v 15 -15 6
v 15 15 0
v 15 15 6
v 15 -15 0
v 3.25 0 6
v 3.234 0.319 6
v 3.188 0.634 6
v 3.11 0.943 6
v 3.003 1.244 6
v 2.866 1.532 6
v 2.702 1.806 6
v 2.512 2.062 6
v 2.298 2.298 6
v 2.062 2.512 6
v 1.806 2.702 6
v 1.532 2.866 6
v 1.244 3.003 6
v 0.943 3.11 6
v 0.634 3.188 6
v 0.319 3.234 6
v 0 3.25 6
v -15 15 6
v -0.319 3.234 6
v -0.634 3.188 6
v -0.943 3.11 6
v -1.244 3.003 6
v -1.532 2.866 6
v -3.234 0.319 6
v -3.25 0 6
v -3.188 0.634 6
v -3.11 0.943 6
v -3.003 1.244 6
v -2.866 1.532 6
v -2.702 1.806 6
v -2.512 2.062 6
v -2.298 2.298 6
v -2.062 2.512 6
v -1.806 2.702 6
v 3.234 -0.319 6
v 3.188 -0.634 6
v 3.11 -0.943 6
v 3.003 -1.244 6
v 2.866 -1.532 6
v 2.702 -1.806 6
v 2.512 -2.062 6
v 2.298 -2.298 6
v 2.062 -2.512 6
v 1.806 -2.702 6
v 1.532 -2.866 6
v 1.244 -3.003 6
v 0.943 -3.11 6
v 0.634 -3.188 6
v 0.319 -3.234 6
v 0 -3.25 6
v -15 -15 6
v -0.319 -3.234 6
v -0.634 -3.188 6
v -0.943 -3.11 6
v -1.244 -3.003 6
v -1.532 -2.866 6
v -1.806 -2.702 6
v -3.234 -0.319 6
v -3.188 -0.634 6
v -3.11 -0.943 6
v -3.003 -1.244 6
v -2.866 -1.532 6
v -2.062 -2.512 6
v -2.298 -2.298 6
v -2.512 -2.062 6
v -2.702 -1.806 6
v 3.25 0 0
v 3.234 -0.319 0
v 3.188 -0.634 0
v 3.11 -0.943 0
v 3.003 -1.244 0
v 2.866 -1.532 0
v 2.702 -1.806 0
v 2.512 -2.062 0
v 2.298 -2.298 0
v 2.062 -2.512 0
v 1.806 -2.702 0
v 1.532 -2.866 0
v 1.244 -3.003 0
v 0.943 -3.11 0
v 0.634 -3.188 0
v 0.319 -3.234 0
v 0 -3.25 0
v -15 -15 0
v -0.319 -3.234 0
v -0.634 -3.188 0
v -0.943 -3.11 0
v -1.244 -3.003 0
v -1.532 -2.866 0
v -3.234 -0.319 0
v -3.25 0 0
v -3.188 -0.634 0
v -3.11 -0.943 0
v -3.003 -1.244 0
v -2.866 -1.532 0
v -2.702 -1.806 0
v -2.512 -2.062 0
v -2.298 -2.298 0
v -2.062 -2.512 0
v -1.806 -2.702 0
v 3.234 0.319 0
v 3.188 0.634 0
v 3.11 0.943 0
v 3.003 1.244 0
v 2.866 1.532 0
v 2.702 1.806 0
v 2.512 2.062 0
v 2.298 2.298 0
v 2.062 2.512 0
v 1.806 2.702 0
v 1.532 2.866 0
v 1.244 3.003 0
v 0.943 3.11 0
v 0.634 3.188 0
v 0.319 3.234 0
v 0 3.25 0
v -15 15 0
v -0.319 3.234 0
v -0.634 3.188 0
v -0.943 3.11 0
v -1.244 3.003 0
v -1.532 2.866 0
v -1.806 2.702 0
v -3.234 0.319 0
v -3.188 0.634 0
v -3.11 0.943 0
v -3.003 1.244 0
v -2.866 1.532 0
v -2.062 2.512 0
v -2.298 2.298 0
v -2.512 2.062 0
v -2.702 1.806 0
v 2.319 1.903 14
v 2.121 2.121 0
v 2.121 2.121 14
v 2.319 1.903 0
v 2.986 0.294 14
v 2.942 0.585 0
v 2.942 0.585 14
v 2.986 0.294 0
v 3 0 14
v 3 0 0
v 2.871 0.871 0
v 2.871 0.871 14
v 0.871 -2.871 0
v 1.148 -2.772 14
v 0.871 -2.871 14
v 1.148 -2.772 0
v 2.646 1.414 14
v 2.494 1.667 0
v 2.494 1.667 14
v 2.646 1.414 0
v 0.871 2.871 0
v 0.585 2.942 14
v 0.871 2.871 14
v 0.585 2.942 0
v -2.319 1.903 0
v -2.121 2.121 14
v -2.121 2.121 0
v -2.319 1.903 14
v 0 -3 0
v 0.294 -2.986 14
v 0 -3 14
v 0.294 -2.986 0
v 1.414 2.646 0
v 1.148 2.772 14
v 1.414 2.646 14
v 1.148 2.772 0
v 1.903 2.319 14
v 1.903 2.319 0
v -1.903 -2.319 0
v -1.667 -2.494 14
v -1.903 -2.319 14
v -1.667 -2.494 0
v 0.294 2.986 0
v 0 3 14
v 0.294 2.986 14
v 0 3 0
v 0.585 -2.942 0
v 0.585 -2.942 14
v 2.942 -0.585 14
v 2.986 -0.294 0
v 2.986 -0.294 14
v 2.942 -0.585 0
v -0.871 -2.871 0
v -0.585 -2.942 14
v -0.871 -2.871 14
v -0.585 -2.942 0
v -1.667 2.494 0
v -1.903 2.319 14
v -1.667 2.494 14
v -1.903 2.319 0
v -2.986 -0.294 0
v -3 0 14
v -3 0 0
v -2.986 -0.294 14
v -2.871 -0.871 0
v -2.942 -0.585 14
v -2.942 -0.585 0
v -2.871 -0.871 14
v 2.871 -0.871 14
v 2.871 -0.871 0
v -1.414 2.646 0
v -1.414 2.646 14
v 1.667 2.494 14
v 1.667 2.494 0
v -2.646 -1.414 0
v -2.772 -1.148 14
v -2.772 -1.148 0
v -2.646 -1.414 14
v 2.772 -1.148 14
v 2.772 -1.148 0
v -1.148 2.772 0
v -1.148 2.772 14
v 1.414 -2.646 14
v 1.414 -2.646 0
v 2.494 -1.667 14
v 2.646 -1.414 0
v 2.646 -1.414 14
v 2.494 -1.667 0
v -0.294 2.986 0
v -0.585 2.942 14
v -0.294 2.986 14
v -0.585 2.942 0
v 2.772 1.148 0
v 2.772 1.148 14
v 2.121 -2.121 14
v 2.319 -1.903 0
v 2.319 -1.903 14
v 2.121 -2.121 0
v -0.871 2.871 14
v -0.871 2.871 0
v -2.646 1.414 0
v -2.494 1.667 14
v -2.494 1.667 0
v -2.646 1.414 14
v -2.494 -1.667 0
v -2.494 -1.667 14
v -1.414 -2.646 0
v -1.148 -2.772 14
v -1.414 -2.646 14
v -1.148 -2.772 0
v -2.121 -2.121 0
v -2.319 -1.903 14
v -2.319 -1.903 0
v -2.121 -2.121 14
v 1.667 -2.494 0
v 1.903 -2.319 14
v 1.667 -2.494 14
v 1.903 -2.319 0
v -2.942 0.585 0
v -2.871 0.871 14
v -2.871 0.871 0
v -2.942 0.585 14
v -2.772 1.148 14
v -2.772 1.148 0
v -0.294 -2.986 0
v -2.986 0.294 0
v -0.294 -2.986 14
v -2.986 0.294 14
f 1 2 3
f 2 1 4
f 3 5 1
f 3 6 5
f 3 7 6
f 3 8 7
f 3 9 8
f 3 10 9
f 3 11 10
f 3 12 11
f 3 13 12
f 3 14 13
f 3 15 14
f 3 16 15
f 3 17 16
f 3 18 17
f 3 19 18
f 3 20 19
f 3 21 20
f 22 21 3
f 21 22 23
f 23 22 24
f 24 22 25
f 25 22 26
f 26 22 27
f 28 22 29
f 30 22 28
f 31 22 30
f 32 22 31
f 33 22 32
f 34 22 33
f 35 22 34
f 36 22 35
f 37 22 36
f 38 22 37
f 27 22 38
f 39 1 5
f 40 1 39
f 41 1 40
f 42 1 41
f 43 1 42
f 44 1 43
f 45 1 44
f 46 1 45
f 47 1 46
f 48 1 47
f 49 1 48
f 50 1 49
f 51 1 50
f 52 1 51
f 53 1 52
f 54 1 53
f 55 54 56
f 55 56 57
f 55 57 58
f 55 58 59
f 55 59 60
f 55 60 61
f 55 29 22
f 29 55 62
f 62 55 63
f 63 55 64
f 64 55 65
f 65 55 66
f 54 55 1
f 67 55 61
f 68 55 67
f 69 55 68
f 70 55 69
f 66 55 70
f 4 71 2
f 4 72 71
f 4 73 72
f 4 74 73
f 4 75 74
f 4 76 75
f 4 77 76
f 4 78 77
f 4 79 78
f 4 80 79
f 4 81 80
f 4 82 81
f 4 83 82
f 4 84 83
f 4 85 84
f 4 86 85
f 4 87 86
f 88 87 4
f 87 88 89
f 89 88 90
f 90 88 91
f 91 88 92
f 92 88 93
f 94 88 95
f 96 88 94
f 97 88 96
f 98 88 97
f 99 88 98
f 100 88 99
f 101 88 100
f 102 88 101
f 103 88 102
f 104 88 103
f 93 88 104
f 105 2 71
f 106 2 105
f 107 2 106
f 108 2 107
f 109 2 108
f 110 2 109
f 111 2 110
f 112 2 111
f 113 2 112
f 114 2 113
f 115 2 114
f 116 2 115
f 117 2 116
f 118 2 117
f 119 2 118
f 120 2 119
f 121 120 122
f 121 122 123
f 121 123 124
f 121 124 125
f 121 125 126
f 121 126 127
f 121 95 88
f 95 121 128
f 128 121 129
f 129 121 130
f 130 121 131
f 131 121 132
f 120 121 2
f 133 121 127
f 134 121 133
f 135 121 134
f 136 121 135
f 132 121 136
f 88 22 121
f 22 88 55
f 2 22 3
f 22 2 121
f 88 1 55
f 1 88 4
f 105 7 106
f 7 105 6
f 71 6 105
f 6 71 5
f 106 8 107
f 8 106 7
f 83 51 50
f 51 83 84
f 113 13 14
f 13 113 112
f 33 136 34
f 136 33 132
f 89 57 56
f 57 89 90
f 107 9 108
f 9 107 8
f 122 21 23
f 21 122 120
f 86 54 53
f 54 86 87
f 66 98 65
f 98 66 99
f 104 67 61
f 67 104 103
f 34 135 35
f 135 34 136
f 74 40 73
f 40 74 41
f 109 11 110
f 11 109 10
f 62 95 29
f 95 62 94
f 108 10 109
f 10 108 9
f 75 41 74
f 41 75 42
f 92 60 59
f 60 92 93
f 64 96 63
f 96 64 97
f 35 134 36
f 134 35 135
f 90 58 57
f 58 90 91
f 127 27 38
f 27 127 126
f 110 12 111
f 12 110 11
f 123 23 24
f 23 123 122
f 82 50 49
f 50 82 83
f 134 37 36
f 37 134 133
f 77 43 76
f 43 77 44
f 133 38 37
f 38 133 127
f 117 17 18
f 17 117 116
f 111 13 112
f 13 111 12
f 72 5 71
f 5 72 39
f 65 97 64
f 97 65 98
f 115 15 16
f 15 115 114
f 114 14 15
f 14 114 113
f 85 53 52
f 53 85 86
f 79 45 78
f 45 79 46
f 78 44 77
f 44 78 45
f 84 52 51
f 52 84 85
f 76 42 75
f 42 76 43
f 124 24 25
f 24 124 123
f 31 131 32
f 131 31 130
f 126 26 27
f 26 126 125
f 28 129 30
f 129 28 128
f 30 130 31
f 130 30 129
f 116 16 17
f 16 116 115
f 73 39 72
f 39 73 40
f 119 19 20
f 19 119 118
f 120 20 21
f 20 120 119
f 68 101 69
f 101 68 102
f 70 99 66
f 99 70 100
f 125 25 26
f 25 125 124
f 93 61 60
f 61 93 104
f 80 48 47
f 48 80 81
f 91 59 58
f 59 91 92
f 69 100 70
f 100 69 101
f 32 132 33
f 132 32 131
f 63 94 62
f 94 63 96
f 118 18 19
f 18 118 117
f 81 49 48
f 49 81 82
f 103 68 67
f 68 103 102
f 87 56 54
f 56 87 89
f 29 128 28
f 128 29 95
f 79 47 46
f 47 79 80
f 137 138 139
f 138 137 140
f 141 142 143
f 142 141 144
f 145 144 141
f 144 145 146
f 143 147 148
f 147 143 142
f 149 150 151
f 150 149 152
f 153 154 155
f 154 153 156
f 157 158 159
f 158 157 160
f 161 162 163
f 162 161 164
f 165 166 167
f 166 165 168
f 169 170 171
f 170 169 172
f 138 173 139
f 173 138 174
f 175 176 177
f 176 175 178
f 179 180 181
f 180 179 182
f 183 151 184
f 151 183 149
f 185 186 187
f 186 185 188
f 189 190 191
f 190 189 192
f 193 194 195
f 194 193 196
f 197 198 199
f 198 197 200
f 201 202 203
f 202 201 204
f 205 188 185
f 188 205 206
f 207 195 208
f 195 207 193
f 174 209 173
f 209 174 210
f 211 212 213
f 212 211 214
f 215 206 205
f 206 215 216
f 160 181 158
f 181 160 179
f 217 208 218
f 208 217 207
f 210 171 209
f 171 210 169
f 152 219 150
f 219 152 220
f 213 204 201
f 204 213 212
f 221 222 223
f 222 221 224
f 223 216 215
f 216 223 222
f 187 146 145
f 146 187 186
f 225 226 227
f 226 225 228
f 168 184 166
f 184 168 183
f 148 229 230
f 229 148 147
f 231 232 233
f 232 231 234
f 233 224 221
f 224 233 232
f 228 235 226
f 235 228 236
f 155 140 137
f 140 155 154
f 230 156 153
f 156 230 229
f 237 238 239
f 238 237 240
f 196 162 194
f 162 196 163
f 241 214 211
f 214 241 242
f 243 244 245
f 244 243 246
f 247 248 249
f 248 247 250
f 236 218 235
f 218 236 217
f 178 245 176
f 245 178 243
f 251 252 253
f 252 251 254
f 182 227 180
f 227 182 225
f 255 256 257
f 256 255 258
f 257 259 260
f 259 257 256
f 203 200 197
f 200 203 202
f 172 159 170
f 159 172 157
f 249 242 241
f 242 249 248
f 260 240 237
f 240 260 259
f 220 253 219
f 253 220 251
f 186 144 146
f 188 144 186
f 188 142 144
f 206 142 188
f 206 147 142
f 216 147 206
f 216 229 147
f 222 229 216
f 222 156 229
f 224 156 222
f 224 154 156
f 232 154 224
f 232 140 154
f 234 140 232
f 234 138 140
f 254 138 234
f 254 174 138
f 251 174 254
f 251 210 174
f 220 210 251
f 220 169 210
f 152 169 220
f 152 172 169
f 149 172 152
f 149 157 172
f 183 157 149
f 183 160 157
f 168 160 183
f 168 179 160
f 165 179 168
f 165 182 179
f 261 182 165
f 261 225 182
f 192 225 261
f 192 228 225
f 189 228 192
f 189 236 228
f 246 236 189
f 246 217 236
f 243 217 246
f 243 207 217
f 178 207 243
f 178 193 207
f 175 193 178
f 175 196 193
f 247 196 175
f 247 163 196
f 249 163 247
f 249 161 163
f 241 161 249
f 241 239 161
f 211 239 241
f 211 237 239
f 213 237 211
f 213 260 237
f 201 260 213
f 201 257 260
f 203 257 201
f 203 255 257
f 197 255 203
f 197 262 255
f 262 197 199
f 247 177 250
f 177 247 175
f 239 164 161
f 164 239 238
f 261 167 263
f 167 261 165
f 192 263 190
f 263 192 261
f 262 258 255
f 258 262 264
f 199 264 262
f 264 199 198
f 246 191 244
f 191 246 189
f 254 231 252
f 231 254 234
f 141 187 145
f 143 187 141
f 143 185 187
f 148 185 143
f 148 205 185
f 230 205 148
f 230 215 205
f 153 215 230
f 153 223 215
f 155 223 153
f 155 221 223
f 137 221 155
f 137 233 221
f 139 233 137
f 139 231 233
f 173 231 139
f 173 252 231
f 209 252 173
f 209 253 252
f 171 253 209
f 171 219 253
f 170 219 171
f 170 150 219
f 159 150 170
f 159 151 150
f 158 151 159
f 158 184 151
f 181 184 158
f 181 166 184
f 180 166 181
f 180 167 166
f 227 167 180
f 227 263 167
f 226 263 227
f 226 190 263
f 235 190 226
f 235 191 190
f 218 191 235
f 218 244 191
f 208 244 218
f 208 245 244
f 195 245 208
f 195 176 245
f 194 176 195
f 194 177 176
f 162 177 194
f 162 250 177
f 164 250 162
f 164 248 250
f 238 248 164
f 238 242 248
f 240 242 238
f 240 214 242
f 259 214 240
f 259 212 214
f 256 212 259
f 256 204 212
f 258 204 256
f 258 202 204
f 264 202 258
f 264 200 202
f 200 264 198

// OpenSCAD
// End-to-end smoke-test design: a vertical peg passes up through a flat
// socket plate, with a controlled clearance fit. Both parts are grounded
// (z=0); the peg sticks out the top of the socket.
//
// CONVENTION (skill orchestrator): each `// part:` module must be defined
// AT ITS FINAL ASSEMBLY POSITION. The `assembly()` module is the canonical
// what-we-print, formed by union of the part calls. Every part should
// touch the bed plane in the as-printed orientation, or `check_grounded`
// will flag it.
//
// part: peg
// part: socket
// fit: peg~socket class=LC
// gravity: -z

// LC (locational clearance) per study 02 ⇒ 0.20–0.30 mm radial gap.
// Use 0.25 mm radial → 0.50 mm diametral.
peg_diameter = 6;
peg_height = 14;
hole_diameter = peg_diameter + 0.50;
plate_size = 30;
plate_thickness = 6;

module peg() {
    // Peg stands on the bed at the origin, axis +z.
    cylinder(h=peg_height, d=peg_diameter, $fn=64);
}

module socket() {
    // Plate sits flat on the bed. Hole concentric with the peg; the peg
    // passes up through the hole and projects (peg_height - plate_thickness)
    // mm above the plate.
    difference() {
        translate([-plate_size / 2, -plate_size / 2, 0])
            cube([plate_size, plate_size, plate_thickness]);
        translate([0, 0, -0.1])
            cylinder(h=plate_thickness + 0.2, d=hole_diameter, $fn=64);
    }
}

module assembly() {
    peg();
    socket();
}

assembly();
